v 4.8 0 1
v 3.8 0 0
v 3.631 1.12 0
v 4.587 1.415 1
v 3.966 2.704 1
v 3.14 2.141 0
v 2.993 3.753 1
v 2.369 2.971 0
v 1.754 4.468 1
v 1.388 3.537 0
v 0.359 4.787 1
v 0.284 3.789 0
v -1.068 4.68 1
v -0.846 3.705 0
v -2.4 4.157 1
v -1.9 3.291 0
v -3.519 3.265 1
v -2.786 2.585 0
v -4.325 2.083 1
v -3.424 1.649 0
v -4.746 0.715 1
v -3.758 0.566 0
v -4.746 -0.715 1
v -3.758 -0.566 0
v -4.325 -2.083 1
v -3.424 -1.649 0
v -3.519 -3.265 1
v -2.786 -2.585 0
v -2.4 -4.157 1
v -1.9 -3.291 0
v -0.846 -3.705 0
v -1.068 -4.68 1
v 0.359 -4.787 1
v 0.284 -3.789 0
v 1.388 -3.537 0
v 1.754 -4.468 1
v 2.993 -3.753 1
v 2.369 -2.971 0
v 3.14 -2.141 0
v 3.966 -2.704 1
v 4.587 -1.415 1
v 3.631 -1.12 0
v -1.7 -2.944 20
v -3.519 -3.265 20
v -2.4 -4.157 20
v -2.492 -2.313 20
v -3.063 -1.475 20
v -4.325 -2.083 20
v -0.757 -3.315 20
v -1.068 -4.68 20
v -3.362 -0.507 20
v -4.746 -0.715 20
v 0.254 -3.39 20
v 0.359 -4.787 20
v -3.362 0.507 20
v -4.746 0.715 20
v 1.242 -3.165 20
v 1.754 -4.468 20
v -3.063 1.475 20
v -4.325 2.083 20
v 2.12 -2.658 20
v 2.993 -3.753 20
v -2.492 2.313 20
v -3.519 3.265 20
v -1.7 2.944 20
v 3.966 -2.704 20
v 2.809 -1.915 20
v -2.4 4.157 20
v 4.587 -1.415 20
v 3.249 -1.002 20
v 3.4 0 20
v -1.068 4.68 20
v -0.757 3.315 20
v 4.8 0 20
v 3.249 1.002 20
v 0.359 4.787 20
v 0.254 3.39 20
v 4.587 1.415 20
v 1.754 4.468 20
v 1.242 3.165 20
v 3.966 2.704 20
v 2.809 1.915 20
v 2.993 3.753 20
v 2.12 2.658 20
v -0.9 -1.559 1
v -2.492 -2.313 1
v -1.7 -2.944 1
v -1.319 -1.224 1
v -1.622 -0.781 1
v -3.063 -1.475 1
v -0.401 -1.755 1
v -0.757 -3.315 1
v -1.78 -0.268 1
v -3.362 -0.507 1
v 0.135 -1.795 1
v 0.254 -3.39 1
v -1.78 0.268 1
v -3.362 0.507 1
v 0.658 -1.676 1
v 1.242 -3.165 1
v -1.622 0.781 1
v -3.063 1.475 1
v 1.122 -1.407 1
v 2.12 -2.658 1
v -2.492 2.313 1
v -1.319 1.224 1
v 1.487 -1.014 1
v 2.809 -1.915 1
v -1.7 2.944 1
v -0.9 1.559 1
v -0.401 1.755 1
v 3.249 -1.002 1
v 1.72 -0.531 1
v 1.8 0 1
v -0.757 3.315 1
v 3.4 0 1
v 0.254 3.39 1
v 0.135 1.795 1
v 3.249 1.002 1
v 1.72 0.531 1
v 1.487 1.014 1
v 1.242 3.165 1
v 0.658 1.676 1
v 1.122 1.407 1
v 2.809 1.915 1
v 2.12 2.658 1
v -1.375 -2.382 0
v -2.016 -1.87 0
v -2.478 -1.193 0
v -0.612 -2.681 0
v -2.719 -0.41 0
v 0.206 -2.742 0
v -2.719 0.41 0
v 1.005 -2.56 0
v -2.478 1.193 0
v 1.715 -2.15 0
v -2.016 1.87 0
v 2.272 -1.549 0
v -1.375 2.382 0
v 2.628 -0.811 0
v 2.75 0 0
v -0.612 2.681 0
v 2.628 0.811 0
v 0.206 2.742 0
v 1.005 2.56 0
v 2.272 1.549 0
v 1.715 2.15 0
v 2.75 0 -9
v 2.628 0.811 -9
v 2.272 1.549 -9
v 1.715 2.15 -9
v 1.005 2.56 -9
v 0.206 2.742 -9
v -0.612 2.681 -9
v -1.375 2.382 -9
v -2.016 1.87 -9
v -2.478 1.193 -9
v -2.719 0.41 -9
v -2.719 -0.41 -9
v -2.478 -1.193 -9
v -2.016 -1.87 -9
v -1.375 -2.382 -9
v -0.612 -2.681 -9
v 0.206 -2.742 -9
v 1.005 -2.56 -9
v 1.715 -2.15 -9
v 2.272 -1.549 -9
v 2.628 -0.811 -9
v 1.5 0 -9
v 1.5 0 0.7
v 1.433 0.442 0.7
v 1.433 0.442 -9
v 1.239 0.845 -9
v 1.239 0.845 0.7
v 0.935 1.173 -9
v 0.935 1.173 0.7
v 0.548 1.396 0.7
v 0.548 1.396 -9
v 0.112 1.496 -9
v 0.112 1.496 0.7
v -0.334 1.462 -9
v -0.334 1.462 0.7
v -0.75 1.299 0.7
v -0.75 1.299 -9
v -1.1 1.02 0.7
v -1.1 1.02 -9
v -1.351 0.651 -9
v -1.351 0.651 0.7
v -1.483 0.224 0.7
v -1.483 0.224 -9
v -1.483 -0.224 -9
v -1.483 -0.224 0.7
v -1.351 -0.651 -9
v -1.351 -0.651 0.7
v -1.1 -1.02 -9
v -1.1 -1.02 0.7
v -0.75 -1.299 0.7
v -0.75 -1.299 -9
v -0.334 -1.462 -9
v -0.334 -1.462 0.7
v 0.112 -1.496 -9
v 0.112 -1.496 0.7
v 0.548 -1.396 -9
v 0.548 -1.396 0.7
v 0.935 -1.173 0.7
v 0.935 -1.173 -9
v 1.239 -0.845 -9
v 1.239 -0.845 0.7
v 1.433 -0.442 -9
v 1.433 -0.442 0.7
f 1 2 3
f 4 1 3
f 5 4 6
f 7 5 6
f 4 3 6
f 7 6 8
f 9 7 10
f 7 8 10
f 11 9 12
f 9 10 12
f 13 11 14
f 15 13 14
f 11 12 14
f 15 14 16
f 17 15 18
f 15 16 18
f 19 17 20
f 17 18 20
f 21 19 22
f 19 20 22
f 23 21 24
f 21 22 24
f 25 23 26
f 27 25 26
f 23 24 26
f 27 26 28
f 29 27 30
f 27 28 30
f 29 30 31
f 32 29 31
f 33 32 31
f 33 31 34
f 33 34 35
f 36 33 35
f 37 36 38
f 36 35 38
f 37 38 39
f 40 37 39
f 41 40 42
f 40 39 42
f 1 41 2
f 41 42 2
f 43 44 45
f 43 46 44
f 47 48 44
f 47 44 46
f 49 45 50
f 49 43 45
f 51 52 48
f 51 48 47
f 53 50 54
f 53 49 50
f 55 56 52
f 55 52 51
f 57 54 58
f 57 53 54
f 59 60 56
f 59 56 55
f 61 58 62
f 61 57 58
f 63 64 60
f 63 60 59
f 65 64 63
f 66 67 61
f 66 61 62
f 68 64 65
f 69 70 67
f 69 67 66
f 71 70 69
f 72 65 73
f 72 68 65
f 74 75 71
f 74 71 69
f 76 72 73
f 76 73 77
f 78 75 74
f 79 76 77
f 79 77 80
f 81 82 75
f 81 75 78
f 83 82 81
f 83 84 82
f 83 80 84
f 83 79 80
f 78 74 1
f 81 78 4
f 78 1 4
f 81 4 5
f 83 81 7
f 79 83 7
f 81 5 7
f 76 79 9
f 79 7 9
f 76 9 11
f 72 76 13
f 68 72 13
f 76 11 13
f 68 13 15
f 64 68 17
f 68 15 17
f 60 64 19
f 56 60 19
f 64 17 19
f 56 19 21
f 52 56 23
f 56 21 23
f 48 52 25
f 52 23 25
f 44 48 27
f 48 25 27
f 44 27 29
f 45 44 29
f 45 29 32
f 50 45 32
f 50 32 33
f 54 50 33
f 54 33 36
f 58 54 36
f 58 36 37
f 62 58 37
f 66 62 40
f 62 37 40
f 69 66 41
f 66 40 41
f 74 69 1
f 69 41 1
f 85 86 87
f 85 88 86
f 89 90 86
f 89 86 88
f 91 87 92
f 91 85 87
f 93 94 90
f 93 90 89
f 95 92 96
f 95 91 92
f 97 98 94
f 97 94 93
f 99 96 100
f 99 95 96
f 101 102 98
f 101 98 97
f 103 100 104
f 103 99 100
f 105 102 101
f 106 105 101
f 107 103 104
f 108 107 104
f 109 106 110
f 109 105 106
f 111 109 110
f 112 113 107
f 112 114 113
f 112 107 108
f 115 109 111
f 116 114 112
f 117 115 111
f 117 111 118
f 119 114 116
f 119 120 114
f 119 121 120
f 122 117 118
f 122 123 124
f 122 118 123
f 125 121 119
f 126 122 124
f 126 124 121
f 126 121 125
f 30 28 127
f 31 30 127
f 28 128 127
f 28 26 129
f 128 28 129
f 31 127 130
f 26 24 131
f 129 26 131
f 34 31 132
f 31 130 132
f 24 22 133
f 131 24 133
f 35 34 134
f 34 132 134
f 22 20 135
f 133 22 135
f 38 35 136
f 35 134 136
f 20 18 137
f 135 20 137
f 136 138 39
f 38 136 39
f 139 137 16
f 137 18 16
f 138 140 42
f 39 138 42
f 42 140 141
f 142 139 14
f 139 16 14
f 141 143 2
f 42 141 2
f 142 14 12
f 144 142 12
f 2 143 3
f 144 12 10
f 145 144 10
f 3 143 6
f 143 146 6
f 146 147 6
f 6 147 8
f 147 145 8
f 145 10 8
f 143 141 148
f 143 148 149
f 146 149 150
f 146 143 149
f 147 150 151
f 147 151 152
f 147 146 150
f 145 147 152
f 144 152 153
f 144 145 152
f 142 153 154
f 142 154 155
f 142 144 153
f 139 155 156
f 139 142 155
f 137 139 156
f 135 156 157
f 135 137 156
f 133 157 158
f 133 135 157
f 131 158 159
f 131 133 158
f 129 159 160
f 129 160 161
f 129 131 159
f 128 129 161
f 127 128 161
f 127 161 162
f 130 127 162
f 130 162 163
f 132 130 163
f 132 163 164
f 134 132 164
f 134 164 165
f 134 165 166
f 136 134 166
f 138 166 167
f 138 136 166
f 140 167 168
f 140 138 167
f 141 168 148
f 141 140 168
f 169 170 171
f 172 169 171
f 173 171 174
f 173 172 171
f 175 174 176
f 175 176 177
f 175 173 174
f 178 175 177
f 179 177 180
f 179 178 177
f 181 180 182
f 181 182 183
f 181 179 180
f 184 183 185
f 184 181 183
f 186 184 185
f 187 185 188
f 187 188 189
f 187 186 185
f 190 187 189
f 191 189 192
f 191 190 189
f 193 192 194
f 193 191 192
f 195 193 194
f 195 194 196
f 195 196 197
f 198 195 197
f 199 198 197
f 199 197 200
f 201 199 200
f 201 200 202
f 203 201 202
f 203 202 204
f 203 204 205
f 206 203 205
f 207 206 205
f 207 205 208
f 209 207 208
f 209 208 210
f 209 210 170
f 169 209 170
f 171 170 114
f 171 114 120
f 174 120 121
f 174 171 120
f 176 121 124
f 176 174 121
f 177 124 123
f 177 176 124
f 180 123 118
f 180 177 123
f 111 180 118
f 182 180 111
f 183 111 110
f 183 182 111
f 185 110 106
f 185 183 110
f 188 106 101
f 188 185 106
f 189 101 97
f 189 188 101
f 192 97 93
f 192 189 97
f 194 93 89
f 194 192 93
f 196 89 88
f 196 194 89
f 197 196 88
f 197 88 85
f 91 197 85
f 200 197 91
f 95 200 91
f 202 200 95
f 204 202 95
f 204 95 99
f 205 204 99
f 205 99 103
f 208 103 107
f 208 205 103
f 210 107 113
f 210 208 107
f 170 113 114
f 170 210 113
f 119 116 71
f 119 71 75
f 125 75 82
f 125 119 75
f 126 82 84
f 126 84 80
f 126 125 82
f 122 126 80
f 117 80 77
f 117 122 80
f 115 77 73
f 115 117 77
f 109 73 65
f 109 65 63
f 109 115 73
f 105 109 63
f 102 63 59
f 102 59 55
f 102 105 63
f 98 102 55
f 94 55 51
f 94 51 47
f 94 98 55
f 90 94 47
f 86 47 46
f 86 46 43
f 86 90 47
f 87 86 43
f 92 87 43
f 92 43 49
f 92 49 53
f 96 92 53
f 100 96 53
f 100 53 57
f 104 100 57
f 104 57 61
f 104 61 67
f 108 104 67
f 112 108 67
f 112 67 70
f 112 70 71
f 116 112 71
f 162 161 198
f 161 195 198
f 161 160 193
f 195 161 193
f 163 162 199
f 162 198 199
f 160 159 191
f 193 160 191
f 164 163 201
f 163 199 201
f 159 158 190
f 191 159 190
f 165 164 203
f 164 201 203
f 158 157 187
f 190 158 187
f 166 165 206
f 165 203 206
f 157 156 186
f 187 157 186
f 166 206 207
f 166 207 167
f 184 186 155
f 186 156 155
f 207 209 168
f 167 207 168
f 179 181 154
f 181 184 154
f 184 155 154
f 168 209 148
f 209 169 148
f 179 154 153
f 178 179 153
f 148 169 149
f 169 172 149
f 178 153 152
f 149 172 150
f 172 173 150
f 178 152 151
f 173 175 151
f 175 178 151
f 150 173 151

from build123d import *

# Parameters (mm, degrees)
F0_R     = 2.75
F0_R_2   = 1.5
F1_DEPTH = 9
F0_R_3   = 3.4
F2_DEPTH = 1
F0_R_4   = 4.8
F3_DEPTH = 20
F4_SIZE  = 1
F5_SIZE  = 0.3


with BuildPart() as f1:
    # F0 (on Top) → F1 (new body)
    with BuildSketch(Plane.XY):
        Circle(F0_R)
        Circle(F0_R_2, mode=Mode.SUBTRACT)
    extrude(amount=-F1_DEPTH)

    # F0 (on Top) → F2 (join)
    with BuildSketch(Plane.XY):
        Circle(F0_R_3)
        Circle(F0_R, mode=Mode.SUBTRACT)
        Circle(F0_R)
        Circle(F0_R_2, mode=Mode.SUBTRACT)
    extrude(amount=F2_DEPTH)

    # F0 (on Top) → F3 (join)
    with BuildSketch(Plane.XY):
        Circle(F0_R_4)
        Circle(F0_R_3, mode=Mode.SUBTRACT)
    extrude(amount=F3_DEPTH)

    # F4
    f4_edges = [f1.edges().sort_by_distance(p)[0] for p in [
        (-4.8, 0, 0),
    ]]
    chamfer(f4_edges, length=F4_SIZE)

    # F5
    f5_edges = [f1.edges().sort_by_distance(p)[0] for p in [
        (-1.5, 0, 1),
    ]]
    chamfer(f5_edges, length=F5_SIZE)


solid = f1.part
